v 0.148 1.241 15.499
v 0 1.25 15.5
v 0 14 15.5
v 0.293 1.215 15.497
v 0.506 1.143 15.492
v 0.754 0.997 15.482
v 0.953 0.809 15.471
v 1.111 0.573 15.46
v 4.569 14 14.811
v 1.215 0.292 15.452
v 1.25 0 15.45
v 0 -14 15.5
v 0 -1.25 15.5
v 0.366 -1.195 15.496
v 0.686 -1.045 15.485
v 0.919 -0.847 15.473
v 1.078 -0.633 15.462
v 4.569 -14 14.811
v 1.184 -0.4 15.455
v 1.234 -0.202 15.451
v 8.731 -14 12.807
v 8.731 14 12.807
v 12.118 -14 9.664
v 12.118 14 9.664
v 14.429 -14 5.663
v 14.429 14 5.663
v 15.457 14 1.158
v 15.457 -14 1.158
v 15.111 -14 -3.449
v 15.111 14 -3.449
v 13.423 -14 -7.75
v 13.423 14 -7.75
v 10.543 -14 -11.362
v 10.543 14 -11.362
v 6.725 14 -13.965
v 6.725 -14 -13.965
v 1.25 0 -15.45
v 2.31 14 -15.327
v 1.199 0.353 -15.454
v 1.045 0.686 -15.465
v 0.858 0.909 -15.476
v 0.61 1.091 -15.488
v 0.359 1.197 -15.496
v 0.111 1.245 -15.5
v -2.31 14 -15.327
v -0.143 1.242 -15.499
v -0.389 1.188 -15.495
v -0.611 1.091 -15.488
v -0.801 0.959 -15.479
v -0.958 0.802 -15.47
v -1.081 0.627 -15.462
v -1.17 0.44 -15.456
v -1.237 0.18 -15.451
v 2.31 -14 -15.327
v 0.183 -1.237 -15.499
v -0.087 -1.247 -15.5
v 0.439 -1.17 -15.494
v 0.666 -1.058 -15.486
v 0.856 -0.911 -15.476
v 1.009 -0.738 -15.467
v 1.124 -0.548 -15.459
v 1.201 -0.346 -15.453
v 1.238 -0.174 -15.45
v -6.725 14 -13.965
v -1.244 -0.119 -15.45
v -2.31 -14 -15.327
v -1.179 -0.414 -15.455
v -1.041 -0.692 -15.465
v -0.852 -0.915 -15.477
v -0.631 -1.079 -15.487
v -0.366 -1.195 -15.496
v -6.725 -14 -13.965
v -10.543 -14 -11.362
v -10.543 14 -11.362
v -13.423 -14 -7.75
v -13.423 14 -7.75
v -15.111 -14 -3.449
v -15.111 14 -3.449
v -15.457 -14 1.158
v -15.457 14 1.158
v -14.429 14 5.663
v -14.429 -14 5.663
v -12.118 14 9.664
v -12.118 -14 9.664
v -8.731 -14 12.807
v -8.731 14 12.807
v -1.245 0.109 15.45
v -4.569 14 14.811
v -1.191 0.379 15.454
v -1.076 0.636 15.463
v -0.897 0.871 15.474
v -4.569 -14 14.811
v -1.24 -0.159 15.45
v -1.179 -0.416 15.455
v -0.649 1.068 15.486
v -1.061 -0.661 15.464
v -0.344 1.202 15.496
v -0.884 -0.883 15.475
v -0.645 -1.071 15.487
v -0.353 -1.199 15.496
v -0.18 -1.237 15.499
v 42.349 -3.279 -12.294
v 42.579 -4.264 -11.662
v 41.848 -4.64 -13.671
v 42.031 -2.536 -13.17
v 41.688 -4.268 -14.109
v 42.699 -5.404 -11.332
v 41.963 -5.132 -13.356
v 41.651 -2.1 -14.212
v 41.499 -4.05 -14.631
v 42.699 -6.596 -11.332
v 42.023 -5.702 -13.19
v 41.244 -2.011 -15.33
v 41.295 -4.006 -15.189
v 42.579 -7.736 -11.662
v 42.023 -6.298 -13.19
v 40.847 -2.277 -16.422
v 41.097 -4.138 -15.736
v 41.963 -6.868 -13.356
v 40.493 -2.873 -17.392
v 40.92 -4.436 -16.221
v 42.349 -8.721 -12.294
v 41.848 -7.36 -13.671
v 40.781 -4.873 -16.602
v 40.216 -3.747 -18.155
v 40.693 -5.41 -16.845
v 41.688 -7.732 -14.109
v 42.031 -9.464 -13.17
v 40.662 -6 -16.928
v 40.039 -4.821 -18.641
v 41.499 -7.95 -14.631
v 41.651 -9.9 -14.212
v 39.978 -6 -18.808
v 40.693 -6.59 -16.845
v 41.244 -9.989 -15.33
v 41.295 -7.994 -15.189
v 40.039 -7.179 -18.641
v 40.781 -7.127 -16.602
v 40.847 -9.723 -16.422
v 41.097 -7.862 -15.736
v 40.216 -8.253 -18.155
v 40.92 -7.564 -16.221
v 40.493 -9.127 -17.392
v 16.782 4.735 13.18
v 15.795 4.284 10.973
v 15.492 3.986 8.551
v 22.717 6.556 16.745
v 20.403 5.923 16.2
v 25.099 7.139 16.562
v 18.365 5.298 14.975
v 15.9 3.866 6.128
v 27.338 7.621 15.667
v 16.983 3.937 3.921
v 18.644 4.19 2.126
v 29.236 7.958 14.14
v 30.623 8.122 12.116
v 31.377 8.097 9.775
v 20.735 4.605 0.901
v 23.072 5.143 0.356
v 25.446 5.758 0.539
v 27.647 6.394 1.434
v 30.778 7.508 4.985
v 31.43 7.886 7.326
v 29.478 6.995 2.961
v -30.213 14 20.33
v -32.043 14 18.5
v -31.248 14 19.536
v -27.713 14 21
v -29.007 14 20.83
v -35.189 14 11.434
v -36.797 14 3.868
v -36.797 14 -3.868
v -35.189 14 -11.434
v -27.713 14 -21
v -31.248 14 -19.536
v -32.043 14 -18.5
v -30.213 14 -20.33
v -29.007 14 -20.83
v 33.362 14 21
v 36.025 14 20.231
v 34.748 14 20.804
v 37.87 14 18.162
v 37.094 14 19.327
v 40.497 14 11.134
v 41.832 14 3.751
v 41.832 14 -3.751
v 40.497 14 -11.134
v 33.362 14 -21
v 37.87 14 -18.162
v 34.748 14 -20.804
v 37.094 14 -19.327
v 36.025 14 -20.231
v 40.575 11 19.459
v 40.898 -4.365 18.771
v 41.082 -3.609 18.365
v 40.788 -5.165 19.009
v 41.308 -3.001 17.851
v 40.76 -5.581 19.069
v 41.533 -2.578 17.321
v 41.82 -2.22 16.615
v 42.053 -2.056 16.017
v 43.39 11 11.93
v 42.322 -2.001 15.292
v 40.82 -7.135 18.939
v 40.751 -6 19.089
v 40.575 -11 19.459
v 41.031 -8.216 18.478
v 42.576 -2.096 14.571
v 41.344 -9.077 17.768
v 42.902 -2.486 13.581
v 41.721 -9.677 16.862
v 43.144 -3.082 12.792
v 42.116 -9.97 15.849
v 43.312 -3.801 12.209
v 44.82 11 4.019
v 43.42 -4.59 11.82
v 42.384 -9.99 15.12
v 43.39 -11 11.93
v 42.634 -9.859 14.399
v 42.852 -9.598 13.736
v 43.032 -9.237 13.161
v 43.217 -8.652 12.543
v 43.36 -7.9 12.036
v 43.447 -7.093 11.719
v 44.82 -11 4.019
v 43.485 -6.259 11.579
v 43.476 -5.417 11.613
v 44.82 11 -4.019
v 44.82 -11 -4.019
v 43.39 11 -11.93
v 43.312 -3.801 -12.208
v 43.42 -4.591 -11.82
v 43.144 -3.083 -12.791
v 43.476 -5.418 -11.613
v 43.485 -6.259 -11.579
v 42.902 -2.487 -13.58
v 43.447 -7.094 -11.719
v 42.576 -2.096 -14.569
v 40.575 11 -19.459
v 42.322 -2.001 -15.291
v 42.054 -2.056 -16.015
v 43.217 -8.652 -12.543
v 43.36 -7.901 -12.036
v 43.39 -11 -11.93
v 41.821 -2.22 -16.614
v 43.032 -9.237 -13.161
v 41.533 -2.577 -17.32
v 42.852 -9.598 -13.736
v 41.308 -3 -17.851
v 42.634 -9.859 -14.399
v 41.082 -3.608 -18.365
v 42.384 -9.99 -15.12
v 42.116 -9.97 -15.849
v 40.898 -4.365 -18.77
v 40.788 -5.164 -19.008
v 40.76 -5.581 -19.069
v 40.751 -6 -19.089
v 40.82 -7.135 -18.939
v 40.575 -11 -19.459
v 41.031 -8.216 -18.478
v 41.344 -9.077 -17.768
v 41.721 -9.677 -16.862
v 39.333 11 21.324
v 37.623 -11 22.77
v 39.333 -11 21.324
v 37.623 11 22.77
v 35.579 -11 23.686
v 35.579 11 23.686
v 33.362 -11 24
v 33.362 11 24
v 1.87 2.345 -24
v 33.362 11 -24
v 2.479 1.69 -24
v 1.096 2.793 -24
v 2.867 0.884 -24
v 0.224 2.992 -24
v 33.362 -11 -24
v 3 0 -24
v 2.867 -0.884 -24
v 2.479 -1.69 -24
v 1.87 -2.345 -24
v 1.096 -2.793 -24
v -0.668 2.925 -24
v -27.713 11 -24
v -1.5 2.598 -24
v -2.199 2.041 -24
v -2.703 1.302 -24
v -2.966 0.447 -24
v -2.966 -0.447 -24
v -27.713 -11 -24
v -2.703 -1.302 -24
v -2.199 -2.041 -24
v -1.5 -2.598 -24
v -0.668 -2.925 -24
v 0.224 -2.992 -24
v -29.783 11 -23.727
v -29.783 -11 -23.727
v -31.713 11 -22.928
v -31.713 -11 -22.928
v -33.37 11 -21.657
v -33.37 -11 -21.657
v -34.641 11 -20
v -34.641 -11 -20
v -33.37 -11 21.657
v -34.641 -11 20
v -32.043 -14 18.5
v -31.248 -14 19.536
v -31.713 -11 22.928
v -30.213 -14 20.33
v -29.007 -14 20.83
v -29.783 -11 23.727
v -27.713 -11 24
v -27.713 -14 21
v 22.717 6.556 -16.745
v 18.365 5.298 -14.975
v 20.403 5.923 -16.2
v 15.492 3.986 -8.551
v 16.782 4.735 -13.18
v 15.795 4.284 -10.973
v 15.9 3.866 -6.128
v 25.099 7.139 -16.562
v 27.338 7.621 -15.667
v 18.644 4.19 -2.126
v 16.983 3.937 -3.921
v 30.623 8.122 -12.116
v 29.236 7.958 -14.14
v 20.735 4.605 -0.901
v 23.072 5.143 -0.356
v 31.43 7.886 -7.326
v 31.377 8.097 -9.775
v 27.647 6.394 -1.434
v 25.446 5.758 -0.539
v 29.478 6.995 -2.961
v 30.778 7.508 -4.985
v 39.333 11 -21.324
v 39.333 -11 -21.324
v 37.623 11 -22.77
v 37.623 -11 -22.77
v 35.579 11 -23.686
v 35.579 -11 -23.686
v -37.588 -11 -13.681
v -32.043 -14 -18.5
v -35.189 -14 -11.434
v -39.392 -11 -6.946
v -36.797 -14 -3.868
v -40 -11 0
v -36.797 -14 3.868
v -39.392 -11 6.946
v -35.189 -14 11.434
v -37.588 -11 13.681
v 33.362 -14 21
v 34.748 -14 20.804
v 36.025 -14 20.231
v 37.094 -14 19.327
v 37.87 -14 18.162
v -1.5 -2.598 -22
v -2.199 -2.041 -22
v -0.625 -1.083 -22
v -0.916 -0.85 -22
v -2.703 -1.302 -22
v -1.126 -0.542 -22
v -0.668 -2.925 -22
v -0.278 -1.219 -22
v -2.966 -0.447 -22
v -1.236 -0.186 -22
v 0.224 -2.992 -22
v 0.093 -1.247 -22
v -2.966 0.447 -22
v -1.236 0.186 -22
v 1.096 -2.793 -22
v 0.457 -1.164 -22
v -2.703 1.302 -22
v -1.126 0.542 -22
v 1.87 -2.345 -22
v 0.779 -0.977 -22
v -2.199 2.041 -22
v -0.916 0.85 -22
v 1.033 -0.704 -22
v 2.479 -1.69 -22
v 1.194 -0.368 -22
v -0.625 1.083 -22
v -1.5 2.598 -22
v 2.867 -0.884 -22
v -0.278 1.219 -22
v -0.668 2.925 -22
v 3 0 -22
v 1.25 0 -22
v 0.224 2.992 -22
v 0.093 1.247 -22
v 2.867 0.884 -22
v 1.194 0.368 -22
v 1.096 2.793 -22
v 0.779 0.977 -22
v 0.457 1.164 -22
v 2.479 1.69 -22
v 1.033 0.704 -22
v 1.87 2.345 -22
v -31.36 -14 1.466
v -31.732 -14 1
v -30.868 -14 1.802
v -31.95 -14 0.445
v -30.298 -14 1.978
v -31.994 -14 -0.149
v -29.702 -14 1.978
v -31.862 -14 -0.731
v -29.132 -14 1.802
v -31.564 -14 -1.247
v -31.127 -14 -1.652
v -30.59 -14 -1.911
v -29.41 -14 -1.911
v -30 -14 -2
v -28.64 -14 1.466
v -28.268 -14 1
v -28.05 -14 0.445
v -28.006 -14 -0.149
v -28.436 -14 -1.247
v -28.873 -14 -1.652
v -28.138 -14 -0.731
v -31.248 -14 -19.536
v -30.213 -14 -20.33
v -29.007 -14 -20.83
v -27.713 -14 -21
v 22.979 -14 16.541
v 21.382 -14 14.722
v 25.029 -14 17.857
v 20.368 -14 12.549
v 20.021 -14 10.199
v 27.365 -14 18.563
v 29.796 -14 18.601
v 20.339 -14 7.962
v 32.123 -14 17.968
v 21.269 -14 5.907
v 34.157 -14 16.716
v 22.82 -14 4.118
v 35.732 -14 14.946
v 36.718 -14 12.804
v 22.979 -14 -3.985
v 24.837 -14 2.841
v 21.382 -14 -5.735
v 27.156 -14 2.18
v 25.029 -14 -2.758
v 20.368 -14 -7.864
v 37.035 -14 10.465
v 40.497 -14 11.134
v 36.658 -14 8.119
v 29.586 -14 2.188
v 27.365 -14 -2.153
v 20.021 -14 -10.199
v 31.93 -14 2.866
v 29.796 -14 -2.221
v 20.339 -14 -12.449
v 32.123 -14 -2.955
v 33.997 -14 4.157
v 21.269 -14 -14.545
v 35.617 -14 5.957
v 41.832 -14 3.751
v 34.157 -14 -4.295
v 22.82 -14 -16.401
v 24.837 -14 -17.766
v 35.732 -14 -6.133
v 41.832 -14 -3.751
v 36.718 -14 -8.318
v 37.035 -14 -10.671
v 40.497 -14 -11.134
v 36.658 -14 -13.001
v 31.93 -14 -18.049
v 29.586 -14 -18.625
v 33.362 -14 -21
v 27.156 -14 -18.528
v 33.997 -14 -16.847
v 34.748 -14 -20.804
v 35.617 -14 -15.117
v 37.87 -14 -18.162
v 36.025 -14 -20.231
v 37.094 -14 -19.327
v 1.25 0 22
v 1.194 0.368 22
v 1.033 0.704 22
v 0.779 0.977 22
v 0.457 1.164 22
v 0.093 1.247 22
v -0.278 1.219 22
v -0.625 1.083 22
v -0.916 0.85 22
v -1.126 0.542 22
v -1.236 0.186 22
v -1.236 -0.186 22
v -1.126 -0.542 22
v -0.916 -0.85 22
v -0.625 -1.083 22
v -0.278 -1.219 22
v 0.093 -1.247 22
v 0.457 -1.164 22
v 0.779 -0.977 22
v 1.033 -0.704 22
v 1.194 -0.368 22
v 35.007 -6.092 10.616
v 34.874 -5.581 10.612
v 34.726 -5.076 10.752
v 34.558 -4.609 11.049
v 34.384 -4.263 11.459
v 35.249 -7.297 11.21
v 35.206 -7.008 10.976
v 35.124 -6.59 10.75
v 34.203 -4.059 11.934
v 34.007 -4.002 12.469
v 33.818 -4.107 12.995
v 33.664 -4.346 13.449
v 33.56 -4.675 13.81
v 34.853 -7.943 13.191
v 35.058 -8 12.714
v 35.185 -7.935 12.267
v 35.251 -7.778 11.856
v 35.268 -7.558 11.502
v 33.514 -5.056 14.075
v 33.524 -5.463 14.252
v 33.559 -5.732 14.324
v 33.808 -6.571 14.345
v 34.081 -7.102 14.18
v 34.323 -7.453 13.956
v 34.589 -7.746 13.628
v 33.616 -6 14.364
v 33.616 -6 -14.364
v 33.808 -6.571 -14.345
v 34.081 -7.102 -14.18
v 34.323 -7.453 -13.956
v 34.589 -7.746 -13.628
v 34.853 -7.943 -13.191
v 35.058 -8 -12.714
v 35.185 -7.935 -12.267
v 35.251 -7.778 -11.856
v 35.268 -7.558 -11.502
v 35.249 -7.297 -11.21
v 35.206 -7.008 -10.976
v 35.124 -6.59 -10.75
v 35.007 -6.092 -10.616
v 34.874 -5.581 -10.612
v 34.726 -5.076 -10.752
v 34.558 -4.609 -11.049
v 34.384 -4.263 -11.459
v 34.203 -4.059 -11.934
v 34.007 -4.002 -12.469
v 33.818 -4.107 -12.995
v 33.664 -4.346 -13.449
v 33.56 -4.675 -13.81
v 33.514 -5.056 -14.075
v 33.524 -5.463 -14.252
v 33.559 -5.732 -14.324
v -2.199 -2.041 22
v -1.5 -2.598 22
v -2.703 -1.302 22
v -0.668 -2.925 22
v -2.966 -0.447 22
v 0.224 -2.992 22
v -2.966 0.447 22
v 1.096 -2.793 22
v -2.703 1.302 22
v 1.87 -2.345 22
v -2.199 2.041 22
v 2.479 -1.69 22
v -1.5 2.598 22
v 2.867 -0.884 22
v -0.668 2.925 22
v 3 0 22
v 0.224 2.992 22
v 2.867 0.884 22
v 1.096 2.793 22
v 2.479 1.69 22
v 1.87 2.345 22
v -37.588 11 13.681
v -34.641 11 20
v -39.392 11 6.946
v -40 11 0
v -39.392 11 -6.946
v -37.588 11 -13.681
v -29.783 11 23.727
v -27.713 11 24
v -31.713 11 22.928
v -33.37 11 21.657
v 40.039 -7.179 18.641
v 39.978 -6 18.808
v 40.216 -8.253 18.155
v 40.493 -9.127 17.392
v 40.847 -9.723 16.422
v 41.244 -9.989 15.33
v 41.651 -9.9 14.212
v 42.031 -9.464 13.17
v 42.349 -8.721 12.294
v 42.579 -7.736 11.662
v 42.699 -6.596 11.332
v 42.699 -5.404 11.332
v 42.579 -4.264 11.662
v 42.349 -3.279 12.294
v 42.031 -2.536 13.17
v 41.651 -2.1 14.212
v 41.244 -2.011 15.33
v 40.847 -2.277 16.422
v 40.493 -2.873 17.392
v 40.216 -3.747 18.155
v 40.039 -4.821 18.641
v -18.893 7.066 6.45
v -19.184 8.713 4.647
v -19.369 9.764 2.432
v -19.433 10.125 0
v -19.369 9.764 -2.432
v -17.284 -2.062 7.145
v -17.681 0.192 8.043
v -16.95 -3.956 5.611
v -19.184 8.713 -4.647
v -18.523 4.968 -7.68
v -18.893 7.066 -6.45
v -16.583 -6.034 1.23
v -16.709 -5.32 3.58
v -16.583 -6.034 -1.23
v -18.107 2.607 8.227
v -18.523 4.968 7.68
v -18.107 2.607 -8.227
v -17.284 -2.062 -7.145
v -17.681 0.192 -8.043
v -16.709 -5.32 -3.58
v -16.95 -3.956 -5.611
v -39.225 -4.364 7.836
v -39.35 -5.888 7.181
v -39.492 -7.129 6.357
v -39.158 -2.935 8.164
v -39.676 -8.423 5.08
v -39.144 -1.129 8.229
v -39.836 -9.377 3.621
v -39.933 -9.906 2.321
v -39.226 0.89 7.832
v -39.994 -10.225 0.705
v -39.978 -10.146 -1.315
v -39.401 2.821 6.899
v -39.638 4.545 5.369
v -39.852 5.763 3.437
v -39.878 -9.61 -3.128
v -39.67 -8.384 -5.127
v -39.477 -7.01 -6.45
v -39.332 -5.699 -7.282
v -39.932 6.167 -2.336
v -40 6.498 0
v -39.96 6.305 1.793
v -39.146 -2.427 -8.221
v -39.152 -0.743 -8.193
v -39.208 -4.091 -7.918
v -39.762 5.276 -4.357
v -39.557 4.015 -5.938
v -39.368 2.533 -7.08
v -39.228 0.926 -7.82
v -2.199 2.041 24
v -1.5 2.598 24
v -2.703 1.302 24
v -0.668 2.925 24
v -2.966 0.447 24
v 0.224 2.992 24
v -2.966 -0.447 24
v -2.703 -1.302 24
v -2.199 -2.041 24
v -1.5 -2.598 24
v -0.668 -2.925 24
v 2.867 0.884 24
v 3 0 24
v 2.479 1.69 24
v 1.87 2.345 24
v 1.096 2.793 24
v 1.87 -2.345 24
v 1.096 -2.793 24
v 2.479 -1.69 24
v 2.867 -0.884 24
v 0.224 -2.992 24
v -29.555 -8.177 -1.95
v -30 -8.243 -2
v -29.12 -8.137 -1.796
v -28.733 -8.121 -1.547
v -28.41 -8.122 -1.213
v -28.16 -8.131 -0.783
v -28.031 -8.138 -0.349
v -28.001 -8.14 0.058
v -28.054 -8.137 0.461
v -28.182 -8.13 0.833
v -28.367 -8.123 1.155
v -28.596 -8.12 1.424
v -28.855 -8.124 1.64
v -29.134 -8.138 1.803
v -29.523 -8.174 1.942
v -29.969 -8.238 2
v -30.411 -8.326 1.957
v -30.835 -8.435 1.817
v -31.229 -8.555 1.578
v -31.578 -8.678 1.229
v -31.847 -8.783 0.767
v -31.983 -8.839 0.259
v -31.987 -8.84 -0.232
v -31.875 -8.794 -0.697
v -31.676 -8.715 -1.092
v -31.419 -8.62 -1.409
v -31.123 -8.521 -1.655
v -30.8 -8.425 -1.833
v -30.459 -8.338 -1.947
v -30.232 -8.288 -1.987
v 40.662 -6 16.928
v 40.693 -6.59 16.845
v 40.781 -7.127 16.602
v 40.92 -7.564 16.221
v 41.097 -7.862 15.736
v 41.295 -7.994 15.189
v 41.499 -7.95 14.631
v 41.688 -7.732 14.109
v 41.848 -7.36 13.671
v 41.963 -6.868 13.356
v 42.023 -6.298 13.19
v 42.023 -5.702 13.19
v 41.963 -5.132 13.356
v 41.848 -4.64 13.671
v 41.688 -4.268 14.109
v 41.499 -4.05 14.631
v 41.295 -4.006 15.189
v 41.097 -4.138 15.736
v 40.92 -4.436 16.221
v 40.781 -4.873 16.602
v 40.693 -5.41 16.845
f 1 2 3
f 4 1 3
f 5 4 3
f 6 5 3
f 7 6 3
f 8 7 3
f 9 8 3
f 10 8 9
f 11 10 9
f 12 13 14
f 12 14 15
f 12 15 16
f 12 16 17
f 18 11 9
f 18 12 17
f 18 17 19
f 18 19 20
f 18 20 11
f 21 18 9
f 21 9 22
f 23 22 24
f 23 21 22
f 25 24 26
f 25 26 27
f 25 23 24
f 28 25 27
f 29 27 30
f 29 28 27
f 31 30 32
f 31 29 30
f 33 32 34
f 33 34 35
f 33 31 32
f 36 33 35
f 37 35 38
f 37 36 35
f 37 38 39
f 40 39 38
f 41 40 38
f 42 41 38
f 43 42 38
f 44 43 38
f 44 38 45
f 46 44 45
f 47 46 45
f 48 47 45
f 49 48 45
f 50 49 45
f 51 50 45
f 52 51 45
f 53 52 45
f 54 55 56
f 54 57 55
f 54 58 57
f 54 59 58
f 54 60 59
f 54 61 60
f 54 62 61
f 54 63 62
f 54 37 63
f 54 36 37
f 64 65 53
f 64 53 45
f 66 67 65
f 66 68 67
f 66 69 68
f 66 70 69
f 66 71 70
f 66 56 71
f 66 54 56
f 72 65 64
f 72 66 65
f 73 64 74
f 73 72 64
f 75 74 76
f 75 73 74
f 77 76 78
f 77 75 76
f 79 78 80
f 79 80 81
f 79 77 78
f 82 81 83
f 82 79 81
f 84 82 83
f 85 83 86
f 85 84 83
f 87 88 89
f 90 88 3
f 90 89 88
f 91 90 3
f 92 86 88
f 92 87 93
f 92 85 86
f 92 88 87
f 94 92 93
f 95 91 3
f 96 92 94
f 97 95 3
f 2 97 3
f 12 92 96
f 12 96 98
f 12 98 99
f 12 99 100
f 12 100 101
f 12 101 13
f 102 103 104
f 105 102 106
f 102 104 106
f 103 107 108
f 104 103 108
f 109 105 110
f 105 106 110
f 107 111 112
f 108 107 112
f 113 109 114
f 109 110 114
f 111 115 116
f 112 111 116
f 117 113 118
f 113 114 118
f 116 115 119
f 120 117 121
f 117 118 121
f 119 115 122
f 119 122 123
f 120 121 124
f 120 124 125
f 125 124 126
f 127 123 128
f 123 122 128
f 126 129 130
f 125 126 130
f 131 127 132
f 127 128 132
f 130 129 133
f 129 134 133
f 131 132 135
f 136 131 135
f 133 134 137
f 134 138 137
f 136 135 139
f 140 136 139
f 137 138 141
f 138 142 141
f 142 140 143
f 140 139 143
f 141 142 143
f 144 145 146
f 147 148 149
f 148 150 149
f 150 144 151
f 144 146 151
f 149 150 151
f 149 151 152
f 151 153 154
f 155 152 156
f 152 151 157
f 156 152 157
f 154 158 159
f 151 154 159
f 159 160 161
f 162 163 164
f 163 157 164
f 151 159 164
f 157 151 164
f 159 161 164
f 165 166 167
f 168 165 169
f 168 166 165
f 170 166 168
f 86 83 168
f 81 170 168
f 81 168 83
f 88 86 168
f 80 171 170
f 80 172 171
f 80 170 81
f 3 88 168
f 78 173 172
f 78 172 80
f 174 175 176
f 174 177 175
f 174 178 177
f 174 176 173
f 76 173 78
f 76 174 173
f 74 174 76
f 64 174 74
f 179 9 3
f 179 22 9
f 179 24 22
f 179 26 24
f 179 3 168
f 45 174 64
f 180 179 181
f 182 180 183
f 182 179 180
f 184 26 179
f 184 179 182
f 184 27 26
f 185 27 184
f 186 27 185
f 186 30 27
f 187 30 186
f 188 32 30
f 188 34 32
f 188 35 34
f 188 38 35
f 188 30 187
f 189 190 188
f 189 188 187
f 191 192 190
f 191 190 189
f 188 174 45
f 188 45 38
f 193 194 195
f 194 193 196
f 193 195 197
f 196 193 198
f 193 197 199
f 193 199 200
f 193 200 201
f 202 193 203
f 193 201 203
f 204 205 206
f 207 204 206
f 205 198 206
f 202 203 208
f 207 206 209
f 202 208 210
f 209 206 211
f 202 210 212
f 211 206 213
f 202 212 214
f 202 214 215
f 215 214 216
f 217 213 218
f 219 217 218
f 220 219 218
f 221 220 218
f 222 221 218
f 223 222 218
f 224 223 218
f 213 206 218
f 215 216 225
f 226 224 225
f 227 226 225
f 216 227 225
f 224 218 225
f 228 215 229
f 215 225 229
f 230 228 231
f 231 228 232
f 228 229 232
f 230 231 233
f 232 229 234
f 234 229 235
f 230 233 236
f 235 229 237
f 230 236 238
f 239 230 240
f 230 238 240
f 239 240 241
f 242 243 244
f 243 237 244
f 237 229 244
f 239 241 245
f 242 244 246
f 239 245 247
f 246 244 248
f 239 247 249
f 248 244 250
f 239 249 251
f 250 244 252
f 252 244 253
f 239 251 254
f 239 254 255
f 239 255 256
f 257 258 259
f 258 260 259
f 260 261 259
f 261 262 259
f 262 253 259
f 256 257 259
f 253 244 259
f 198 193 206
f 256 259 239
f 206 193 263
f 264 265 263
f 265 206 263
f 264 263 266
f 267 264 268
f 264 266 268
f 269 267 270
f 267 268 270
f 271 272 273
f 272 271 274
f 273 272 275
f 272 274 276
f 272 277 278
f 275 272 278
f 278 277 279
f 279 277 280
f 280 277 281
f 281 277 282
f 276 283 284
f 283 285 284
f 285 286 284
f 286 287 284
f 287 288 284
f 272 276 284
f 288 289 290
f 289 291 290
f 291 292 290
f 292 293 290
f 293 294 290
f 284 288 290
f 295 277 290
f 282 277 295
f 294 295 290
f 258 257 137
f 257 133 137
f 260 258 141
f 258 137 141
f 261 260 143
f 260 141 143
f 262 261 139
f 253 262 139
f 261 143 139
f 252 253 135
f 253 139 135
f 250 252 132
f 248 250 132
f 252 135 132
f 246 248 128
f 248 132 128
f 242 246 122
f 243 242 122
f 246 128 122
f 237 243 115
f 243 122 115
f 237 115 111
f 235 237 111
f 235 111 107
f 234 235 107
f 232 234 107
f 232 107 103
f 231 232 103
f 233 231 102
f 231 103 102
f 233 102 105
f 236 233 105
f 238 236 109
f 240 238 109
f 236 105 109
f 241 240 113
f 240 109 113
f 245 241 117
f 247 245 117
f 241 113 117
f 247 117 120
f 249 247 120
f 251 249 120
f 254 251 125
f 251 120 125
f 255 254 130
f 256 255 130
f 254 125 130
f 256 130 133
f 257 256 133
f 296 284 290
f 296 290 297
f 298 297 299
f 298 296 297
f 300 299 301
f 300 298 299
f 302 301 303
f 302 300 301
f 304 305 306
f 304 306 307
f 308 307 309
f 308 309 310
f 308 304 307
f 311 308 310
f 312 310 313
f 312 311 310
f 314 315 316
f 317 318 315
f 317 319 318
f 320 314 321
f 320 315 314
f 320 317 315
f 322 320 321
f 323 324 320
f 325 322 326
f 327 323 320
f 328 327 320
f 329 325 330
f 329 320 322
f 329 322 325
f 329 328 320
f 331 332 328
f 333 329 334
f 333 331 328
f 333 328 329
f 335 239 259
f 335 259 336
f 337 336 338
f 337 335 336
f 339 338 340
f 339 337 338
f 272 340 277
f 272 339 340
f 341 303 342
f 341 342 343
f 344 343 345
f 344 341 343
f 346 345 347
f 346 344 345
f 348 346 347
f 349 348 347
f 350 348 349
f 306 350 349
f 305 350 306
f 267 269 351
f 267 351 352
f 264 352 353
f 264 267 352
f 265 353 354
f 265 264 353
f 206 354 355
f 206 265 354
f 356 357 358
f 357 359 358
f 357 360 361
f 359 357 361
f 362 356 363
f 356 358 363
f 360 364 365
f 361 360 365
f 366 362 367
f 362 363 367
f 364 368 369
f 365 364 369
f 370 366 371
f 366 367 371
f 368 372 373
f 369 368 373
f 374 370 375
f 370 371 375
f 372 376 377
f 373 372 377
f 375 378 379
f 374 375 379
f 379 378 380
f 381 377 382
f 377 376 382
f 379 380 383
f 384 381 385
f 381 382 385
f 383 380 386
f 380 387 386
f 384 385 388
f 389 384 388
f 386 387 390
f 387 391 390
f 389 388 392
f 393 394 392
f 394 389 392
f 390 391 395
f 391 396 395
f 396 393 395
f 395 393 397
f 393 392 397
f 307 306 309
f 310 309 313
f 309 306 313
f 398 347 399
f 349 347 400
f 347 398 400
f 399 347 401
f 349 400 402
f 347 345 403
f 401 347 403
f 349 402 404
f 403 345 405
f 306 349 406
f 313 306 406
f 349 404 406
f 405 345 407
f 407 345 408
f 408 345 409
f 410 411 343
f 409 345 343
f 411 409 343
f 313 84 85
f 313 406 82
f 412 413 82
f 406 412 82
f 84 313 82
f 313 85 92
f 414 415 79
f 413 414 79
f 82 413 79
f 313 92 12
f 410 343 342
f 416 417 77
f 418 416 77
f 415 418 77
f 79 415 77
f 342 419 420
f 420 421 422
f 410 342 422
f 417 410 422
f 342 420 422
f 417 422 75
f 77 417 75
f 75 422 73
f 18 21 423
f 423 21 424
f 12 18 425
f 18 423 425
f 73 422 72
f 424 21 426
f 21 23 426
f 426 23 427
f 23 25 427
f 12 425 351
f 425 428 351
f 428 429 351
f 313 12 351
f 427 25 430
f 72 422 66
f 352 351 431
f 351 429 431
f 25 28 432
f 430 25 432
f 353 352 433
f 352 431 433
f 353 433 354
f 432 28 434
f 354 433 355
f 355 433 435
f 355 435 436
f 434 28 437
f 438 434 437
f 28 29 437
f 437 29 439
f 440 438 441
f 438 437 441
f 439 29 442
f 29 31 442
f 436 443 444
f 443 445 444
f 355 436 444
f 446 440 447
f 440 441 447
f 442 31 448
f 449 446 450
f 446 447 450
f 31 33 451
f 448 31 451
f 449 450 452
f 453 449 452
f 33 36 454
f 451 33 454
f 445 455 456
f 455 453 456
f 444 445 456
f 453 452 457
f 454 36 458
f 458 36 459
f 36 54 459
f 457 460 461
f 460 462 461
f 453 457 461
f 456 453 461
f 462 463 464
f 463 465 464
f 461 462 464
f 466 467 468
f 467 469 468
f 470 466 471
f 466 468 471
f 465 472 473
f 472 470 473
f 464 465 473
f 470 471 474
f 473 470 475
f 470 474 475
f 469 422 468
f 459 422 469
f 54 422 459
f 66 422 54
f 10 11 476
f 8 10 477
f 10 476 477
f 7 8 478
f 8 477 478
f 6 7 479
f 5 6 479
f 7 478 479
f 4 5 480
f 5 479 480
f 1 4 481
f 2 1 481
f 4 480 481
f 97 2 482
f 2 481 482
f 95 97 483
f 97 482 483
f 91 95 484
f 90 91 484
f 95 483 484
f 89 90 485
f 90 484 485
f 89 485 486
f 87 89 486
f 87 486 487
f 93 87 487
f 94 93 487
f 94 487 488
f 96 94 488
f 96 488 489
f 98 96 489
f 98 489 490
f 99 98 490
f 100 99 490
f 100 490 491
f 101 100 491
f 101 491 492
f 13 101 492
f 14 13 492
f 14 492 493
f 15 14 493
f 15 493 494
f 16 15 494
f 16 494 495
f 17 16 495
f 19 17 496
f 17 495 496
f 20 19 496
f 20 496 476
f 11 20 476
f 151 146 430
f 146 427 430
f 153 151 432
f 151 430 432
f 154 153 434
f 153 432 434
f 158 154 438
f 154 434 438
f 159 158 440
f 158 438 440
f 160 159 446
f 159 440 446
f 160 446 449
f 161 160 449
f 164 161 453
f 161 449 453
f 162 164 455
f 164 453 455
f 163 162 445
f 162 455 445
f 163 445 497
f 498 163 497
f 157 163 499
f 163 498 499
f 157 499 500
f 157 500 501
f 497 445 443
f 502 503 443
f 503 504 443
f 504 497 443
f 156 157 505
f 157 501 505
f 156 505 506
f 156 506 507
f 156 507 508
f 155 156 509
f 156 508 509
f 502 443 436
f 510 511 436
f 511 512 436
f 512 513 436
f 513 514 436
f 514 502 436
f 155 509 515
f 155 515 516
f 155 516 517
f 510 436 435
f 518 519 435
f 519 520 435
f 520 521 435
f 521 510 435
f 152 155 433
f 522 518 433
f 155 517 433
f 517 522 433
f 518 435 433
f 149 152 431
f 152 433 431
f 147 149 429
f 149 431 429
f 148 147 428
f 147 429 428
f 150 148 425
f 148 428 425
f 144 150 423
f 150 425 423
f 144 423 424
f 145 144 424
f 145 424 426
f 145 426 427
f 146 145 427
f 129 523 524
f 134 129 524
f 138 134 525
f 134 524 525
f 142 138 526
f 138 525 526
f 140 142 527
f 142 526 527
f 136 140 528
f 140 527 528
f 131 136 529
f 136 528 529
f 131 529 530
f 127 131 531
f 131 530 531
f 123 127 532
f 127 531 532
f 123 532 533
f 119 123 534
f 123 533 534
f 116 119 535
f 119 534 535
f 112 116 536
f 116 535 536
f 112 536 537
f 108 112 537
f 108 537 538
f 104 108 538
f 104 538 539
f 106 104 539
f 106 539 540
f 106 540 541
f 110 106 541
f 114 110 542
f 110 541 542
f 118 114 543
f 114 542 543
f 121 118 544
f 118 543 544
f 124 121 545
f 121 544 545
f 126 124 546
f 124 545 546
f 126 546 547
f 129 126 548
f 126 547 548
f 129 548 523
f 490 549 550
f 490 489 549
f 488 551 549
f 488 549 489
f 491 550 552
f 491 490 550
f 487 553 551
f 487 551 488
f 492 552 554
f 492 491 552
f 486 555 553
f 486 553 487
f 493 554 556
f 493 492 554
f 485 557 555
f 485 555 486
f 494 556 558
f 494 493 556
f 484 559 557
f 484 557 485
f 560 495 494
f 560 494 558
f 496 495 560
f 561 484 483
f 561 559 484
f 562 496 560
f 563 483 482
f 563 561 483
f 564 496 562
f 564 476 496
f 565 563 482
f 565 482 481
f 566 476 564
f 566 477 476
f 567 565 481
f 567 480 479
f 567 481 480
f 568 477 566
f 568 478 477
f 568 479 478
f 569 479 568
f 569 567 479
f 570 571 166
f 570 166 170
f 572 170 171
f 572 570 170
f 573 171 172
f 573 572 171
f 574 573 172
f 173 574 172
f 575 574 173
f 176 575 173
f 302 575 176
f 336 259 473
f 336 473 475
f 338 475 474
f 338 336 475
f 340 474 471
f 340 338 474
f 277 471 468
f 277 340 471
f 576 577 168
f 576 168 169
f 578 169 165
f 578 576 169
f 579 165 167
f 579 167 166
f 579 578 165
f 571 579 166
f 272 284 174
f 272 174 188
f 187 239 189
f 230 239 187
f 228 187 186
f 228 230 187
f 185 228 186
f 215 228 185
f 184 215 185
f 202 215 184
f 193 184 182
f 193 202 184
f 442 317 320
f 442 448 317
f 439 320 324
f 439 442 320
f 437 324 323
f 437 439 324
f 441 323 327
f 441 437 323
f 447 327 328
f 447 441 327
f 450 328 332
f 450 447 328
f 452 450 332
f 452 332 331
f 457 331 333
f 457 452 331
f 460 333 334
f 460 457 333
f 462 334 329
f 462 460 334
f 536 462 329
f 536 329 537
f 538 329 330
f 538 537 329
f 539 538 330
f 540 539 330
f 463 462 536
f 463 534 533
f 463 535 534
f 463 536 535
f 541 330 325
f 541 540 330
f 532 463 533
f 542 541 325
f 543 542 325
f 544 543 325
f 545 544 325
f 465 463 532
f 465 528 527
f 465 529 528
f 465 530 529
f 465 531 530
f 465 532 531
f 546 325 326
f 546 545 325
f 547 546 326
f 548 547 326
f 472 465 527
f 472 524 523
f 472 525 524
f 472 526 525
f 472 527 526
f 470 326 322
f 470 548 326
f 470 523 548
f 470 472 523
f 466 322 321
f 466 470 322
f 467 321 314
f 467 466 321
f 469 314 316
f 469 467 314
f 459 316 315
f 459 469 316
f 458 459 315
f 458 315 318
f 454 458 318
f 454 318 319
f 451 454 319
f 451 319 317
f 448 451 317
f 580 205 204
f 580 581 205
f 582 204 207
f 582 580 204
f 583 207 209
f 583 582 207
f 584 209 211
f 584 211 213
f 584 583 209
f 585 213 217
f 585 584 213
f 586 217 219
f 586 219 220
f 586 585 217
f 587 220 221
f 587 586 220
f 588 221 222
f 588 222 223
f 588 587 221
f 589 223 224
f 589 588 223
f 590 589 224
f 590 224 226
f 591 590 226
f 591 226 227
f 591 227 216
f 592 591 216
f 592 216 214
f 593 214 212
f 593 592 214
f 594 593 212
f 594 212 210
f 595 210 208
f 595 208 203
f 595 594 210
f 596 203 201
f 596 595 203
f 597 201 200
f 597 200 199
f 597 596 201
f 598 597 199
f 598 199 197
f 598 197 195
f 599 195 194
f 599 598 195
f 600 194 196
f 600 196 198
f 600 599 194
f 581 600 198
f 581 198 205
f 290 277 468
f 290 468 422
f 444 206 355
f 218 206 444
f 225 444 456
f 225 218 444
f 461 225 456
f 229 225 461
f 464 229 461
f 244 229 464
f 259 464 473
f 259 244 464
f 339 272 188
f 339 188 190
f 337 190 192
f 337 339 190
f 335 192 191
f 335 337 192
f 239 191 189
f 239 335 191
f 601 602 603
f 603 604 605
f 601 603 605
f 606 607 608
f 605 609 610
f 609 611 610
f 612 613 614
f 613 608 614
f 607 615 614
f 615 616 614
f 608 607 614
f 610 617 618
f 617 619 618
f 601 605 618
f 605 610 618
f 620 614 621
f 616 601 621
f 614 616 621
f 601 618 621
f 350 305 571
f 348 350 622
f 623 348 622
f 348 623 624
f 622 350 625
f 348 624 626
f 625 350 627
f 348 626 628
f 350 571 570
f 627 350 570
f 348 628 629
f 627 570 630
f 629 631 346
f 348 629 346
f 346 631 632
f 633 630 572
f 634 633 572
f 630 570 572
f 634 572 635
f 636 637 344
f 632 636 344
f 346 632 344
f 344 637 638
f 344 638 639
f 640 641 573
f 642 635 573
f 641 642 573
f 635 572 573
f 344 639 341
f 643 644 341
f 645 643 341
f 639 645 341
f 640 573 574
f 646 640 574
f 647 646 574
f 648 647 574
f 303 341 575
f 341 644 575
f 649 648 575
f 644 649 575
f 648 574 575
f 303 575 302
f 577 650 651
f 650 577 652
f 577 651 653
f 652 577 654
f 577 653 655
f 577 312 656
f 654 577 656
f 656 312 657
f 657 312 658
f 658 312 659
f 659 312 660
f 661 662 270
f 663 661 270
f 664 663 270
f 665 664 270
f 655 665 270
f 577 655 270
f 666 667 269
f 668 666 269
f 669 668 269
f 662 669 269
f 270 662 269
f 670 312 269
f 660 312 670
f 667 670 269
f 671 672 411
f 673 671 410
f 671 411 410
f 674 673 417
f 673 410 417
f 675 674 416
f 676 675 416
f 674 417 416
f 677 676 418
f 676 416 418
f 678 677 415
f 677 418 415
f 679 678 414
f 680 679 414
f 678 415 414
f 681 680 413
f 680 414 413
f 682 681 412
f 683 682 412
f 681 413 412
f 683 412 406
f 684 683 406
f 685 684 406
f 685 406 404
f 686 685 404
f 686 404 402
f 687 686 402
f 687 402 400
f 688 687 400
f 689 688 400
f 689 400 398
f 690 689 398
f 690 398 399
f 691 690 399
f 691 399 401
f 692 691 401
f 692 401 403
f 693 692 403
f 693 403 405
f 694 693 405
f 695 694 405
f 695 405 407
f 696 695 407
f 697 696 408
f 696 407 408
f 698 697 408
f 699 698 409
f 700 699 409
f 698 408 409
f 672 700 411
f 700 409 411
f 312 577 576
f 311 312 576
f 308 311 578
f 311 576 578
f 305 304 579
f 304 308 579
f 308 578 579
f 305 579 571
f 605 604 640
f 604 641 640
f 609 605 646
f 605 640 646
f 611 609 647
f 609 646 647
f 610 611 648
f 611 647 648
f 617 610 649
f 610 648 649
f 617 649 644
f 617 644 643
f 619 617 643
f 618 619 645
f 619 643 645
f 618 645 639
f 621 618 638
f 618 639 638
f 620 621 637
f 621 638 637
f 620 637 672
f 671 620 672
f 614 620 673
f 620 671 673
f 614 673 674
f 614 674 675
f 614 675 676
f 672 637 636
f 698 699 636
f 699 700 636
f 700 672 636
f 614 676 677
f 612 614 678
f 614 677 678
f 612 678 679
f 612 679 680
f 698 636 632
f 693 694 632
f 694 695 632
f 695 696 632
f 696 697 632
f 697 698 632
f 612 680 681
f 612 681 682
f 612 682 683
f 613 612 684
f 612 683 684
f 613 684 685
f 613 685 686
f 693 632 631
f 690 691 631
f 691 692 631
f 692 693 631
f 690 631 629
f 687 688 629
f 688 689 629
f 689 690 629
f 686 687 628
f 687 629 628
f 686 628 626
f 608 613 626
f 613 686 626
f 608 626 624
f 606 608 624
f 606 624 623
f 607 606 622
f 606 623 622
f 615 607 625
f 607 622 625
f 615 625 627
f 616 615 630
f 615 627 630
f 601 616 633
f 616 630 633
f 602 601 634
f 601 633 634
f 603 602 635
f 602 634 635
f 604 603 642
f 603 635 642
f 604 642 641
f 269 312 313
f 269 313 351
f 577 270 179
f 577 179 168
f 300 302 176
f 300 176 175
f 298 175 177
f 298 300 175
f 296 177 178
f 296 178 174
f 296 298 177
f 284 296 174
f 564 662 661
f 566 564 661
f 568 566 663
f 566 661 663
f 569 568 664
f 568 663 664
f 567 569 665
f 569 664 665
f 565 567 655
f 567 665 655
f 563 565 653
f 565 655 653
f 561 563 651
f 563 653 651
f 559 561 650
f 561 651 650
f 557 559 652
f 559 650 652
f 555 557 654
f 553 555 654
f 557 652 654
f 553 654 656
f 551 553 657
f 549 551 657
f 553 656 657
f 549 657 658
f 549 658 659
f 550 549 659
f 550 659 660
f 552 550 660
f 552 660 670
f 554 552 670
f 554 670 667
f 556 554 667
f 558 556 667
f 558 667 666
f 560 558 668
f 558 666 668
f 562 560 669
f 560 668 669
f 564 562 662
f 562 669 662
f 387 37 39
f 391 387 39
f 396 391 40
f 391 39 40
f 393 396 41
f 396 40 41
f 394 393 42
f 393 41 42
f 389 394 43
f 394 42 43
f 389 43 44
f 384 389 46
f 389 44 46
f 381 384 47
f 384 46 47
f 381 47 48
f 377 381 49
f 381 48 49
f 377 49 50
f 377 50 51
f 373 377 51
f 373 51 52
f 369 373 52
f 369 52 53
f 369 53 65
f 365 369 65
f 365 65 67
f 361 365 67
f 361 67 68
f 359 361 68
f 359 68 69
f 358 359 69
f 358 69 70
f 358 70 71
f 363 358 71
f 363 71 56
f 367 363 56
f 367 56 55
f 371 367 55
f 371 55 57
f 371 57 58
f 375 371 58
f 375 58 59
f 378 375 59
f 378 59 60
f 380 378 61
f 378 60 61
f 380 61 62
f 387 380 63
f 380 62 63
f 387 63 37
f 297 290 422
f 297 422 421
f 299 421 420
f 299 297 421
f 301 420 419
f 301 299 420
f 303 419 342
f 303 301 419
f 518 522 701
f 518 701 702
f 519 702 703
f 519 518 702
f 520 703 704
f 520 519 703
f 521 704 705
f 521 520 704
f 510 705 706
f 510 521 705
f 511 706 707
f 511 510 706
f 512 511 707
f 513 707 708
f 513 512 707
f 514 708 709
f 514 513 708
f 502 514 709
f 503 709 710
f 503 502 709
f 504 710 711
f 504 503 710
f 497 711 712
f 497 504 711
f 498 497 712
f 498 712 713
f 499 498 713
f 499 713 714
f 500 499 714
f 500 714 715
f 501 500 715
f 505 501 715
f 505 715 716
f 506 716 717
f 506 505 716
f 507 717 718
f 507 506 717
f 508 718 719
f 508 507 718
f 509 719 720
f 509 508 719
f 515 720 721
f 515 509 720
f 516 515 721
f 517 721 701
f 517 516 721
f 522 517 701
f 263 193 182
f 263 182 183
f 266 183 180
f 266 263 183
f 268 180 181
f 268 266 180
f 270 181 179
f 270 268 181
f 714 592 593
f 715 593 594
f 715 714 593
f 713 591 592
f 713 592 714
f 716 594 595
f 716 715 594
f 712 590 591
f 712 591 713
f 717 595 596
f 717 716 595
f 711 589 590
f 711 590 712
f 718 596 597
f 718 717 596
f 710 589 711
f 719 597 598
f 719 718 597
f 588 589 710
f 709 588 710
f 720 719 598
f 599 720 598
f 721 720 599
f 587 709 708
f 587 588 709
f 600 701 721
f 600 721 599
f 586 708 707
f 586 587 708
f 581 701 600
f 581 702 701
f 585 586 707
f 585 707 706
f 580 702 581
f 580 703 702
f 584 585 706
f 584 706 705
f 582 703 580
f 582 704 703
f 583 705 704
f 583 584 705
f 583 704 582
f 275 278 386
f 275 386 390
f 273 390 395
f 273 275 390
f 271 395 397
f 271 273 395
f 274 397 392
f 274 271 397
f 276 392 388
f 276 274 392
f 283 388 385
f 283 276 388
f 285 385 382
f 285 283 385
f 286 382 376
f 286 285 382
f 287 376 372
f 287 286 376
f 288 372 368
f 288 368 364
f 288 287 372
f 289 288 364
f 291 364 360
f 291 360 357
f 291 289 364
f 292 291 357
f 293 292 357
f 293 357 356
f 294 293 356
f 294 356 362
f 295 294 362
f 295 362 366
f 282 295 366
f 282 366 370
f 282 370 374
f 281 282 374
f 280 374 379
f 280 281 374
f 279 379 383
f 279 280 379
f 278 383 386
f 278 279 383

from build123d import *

# Parameters (mm, degrees)
SKETCH1_R               = 15.5
BOSS_EXTRUDE1_DEPTH     = 14
MOVE_START              = -14
MOVE_FACE1_DEPTH        = 28
CUT_EXTRUDE2_REACH      = 60.181
CUT_EXTRUDE2_END_RADIUS = 8.25
SKETCH5_R               = 2
SKETCH7_R               = 1.25
CUT_EXTRUDE3_DEPTH      = 68.268120394
FILLET1_R               = 8
CHAMFER1_SIZE           = 3
SKETCH8_R               = 3
CUT_EXTRUDE4_DEPTH      = 2


# Read off the part's stored shape, not the designer's step: Move Face1
with BuildPart() as part:
    # Sketch1 → Boss-Extrude1 (new, symmetric)
    with BuildSketch(Plane(origin=(0, 0, 0), x_dir=(1, 0, 0), z_dir=(0, 1, 0))):
        with BuildLine():
            Line((-32, 24), (32, 24))
            ThreePointArc((32, 24), (40, 0), (32, -24))
            Line((32, -24), (-32, -24))
            ThreePointArc((-32, -24), (-40, 0), (-32, 24))
        make_face()
        with Locations(Location((0, 0, 0), (0, 0, 270))):
            Circle(SKETCH1_R, mode=Mode.SUBTRACT)
    extrude(amount=BOSS_EXTRUDE1_DEPTH, both=True)

    # Sketch3 → Cut-Revolve1 (revolve, cut)
    with BuildSketch(Plane.XY):
        Polygon((-18, 2), (-19.432597466, 10.124663962), (-53.885297859, 4.049723325), (-52.452700394, -4.074940638), align=None)
    revolve(axis=Axis((-18, 2, 0), (-0.9848077530122092, -0.1736481776669237, 0)), mode=Mode.SUBTRACT)

    # Move Face1 outline → Move Face1 (add)
    with BuildSketch(Plane(origin=(0, 0, 0), x_dir=(1, 0, 0), z_dir=(0, 1, 0)).offset(MOVE_START)):
        with BuildLine():
            ThreePointArc((38.065732621, -24), (45, 0), (38.065732621, 24))
            Line((38.065732621, 24), (32, 24))
            ThreePointArc((32, 24), (40, 0), (32, -24))
            Line((32, -24), (38.065732621, -24))
        make_face()
    extrude(amount=MOVE_FACE1_DEPTH)

    # Sketch4 → Cut-Revolve2 (revolve, cut)
    with BuildSketch(Plane(origin=(0, 0, 0), x_dir=(0, -1, 0), z_dir=(-0.34202014332566943, 0, 0.9396926207859081)), mode=Mode.PRIVATE) as cut_revolve2_sk:
        Polygon((-6, 25), (-8.135257122, 32.968888067), (31.446035064, 43.574663343), (33.581292186, 35.605775277), align=None)
    cut_revolve2 = revolve(cut_revolve2_sk.sketch.rotate(Axis((23.49231552, 6, 8.550503583), (0.24321034680169487, -0.9659258262890681, 0.08852132690137743)), 160.629944791), axis=Axis((23.49231552, 6, 8.550503583), (0.24321034680169487, -0.9659258262890681, 0.08852132690137743)), mode=Mode.SUBTRACT)

    # Sketch6 → Cut-Revolve3 (revolve, cut)
    with BuildSketch(Plane(origin=(0, 0, 0), x_dir=(0, -1, 0), z_dir=(-0.34202014332566943, 0, 0.9396926207859081)), mode=Mode.PRIVATE) as cut_revolve3_sk:
        Polygon((4, 30), (6, 30), (6, 45), (6, 46), (2, 46), (2, 45), (2, 44), (4, 44), align=None)
    cut_revolve3 = revolve(cut_revolve3_sk.sketch.rotate(Axis((28.190778624, -6, 10.2606043), (0.9396926207859081, 0, 0.3420201433256695)), 90), axis=Axis((28.190778624, -6, 10.2606043), (0.9396926207859081, 0, 0.3420201433256695)), mode=Mode.SUBTRACT)

    # Mirror1: Cut-Revolve2, Cut-Revolve3 across plane
    add(cut_revolve2.mirror(Plane.XY), mode=Mode.SUBTRACT)
    add(cut_revolve3.mirror(Plane.XY), mode=Mode.SUBTRACT)

    # Cut-Extrude2: up to this cylinder (the profile starts outside it)
    cut_extrude2_end = Plane(origin=(-32.374316871, -0.534579894, 0), z_dir=(0.9848077530122092, 0.1736481776669237, 0)) * Cylinder(CUT_EXTRUDE2_END_RADIUS, 137.862, mode=Mode.PRIVATE)
    # Sketch5 → Cut-Extrude2 (cut, up to the surface)
    with BuildSketch(Plane.XZ.offset(14), mode=Mode.PRIVATE) as cut_extrude2_sk1:
        with Locations(Location((-30, 0, 0), (0, 0, 270))):
            Circle(SKETCH5_R)
    cut_extrude2_tool1 = extrude(cut_extrude2_sk1.sketch, amount=-CUT_EXTRUDE2_REACH, mode=Mode.PRIVATE) - cut_extrude2_end
    add(cut_extrude2_tool1.solids().sort_by_distance((-30, -14, 0))[0], mode=Mode.SUBTRACT)

    # Sketch7 → Cut-Extrude3 (cut, through all)
    with BuildSketch(Plane.XY.offset(24)):
        Circle(SKETCH7_R)
    extrude(amount=-CUT_EXTRUDE3_DEPTH, mode=Mode.SUBTRACT)

    # Fillet1
    fillet1_edges = [part.edges().sort_by_distance(p)[0] for p in [
        (-32, 0, -24),
        (38.065732621, 0, -24),
        (38.065732621, 0, 24),
        (-32, 0, 24),
    ]]
    fillet(fillet1_edges, radius=FILLET1_R)

    # Chamfer1
    chamfer1_edges = [part.edges().sort_by_distance(p)[0] for p in [
        (2.824420857, -14, -24),
        (2.824420857, 14, -24),
        (-40, -14, 0),
        (45, -14, 0),
        (2.824420857, -14, 24),
        (-31.712812921, -14, 22.92820323),
        (-31.712812921, -14, -22.92820323),
        (37.623363466, -14, 22.770364675),
        (37.623363466, -14, -22.770364675),
        (45, 14, 0),
        (-40, 14, 0),
        (2.824420857, 14, 24),
        (-31.712812921, 14, 22.92820323),
        (-31.712812921, 14, -22.92820323),
        (37.623363466, 14, 22.770364675),
        (37.623363466, 14, -22.770364675),
    ]]
    chamfer(chamfer1_edges, length=CHAMFER1_SIZE)

    # Sketch8 → Cut-Extrude4 (cut)
    with BuildSketch(Plane.XY.offset(24)):
        Circle(SKETCH8_R)
    cut_extrude4 = extrude(amount=-CUT_EXTRUDE4_DEPTH, mode=Mode.SUBTRACT)

    # Mirror2: Cut-Extrude4 across plane
    add(cut_extrude4.mirror(Plane.XY), mode=Mode.SUBTRACT)


solid = part.part
